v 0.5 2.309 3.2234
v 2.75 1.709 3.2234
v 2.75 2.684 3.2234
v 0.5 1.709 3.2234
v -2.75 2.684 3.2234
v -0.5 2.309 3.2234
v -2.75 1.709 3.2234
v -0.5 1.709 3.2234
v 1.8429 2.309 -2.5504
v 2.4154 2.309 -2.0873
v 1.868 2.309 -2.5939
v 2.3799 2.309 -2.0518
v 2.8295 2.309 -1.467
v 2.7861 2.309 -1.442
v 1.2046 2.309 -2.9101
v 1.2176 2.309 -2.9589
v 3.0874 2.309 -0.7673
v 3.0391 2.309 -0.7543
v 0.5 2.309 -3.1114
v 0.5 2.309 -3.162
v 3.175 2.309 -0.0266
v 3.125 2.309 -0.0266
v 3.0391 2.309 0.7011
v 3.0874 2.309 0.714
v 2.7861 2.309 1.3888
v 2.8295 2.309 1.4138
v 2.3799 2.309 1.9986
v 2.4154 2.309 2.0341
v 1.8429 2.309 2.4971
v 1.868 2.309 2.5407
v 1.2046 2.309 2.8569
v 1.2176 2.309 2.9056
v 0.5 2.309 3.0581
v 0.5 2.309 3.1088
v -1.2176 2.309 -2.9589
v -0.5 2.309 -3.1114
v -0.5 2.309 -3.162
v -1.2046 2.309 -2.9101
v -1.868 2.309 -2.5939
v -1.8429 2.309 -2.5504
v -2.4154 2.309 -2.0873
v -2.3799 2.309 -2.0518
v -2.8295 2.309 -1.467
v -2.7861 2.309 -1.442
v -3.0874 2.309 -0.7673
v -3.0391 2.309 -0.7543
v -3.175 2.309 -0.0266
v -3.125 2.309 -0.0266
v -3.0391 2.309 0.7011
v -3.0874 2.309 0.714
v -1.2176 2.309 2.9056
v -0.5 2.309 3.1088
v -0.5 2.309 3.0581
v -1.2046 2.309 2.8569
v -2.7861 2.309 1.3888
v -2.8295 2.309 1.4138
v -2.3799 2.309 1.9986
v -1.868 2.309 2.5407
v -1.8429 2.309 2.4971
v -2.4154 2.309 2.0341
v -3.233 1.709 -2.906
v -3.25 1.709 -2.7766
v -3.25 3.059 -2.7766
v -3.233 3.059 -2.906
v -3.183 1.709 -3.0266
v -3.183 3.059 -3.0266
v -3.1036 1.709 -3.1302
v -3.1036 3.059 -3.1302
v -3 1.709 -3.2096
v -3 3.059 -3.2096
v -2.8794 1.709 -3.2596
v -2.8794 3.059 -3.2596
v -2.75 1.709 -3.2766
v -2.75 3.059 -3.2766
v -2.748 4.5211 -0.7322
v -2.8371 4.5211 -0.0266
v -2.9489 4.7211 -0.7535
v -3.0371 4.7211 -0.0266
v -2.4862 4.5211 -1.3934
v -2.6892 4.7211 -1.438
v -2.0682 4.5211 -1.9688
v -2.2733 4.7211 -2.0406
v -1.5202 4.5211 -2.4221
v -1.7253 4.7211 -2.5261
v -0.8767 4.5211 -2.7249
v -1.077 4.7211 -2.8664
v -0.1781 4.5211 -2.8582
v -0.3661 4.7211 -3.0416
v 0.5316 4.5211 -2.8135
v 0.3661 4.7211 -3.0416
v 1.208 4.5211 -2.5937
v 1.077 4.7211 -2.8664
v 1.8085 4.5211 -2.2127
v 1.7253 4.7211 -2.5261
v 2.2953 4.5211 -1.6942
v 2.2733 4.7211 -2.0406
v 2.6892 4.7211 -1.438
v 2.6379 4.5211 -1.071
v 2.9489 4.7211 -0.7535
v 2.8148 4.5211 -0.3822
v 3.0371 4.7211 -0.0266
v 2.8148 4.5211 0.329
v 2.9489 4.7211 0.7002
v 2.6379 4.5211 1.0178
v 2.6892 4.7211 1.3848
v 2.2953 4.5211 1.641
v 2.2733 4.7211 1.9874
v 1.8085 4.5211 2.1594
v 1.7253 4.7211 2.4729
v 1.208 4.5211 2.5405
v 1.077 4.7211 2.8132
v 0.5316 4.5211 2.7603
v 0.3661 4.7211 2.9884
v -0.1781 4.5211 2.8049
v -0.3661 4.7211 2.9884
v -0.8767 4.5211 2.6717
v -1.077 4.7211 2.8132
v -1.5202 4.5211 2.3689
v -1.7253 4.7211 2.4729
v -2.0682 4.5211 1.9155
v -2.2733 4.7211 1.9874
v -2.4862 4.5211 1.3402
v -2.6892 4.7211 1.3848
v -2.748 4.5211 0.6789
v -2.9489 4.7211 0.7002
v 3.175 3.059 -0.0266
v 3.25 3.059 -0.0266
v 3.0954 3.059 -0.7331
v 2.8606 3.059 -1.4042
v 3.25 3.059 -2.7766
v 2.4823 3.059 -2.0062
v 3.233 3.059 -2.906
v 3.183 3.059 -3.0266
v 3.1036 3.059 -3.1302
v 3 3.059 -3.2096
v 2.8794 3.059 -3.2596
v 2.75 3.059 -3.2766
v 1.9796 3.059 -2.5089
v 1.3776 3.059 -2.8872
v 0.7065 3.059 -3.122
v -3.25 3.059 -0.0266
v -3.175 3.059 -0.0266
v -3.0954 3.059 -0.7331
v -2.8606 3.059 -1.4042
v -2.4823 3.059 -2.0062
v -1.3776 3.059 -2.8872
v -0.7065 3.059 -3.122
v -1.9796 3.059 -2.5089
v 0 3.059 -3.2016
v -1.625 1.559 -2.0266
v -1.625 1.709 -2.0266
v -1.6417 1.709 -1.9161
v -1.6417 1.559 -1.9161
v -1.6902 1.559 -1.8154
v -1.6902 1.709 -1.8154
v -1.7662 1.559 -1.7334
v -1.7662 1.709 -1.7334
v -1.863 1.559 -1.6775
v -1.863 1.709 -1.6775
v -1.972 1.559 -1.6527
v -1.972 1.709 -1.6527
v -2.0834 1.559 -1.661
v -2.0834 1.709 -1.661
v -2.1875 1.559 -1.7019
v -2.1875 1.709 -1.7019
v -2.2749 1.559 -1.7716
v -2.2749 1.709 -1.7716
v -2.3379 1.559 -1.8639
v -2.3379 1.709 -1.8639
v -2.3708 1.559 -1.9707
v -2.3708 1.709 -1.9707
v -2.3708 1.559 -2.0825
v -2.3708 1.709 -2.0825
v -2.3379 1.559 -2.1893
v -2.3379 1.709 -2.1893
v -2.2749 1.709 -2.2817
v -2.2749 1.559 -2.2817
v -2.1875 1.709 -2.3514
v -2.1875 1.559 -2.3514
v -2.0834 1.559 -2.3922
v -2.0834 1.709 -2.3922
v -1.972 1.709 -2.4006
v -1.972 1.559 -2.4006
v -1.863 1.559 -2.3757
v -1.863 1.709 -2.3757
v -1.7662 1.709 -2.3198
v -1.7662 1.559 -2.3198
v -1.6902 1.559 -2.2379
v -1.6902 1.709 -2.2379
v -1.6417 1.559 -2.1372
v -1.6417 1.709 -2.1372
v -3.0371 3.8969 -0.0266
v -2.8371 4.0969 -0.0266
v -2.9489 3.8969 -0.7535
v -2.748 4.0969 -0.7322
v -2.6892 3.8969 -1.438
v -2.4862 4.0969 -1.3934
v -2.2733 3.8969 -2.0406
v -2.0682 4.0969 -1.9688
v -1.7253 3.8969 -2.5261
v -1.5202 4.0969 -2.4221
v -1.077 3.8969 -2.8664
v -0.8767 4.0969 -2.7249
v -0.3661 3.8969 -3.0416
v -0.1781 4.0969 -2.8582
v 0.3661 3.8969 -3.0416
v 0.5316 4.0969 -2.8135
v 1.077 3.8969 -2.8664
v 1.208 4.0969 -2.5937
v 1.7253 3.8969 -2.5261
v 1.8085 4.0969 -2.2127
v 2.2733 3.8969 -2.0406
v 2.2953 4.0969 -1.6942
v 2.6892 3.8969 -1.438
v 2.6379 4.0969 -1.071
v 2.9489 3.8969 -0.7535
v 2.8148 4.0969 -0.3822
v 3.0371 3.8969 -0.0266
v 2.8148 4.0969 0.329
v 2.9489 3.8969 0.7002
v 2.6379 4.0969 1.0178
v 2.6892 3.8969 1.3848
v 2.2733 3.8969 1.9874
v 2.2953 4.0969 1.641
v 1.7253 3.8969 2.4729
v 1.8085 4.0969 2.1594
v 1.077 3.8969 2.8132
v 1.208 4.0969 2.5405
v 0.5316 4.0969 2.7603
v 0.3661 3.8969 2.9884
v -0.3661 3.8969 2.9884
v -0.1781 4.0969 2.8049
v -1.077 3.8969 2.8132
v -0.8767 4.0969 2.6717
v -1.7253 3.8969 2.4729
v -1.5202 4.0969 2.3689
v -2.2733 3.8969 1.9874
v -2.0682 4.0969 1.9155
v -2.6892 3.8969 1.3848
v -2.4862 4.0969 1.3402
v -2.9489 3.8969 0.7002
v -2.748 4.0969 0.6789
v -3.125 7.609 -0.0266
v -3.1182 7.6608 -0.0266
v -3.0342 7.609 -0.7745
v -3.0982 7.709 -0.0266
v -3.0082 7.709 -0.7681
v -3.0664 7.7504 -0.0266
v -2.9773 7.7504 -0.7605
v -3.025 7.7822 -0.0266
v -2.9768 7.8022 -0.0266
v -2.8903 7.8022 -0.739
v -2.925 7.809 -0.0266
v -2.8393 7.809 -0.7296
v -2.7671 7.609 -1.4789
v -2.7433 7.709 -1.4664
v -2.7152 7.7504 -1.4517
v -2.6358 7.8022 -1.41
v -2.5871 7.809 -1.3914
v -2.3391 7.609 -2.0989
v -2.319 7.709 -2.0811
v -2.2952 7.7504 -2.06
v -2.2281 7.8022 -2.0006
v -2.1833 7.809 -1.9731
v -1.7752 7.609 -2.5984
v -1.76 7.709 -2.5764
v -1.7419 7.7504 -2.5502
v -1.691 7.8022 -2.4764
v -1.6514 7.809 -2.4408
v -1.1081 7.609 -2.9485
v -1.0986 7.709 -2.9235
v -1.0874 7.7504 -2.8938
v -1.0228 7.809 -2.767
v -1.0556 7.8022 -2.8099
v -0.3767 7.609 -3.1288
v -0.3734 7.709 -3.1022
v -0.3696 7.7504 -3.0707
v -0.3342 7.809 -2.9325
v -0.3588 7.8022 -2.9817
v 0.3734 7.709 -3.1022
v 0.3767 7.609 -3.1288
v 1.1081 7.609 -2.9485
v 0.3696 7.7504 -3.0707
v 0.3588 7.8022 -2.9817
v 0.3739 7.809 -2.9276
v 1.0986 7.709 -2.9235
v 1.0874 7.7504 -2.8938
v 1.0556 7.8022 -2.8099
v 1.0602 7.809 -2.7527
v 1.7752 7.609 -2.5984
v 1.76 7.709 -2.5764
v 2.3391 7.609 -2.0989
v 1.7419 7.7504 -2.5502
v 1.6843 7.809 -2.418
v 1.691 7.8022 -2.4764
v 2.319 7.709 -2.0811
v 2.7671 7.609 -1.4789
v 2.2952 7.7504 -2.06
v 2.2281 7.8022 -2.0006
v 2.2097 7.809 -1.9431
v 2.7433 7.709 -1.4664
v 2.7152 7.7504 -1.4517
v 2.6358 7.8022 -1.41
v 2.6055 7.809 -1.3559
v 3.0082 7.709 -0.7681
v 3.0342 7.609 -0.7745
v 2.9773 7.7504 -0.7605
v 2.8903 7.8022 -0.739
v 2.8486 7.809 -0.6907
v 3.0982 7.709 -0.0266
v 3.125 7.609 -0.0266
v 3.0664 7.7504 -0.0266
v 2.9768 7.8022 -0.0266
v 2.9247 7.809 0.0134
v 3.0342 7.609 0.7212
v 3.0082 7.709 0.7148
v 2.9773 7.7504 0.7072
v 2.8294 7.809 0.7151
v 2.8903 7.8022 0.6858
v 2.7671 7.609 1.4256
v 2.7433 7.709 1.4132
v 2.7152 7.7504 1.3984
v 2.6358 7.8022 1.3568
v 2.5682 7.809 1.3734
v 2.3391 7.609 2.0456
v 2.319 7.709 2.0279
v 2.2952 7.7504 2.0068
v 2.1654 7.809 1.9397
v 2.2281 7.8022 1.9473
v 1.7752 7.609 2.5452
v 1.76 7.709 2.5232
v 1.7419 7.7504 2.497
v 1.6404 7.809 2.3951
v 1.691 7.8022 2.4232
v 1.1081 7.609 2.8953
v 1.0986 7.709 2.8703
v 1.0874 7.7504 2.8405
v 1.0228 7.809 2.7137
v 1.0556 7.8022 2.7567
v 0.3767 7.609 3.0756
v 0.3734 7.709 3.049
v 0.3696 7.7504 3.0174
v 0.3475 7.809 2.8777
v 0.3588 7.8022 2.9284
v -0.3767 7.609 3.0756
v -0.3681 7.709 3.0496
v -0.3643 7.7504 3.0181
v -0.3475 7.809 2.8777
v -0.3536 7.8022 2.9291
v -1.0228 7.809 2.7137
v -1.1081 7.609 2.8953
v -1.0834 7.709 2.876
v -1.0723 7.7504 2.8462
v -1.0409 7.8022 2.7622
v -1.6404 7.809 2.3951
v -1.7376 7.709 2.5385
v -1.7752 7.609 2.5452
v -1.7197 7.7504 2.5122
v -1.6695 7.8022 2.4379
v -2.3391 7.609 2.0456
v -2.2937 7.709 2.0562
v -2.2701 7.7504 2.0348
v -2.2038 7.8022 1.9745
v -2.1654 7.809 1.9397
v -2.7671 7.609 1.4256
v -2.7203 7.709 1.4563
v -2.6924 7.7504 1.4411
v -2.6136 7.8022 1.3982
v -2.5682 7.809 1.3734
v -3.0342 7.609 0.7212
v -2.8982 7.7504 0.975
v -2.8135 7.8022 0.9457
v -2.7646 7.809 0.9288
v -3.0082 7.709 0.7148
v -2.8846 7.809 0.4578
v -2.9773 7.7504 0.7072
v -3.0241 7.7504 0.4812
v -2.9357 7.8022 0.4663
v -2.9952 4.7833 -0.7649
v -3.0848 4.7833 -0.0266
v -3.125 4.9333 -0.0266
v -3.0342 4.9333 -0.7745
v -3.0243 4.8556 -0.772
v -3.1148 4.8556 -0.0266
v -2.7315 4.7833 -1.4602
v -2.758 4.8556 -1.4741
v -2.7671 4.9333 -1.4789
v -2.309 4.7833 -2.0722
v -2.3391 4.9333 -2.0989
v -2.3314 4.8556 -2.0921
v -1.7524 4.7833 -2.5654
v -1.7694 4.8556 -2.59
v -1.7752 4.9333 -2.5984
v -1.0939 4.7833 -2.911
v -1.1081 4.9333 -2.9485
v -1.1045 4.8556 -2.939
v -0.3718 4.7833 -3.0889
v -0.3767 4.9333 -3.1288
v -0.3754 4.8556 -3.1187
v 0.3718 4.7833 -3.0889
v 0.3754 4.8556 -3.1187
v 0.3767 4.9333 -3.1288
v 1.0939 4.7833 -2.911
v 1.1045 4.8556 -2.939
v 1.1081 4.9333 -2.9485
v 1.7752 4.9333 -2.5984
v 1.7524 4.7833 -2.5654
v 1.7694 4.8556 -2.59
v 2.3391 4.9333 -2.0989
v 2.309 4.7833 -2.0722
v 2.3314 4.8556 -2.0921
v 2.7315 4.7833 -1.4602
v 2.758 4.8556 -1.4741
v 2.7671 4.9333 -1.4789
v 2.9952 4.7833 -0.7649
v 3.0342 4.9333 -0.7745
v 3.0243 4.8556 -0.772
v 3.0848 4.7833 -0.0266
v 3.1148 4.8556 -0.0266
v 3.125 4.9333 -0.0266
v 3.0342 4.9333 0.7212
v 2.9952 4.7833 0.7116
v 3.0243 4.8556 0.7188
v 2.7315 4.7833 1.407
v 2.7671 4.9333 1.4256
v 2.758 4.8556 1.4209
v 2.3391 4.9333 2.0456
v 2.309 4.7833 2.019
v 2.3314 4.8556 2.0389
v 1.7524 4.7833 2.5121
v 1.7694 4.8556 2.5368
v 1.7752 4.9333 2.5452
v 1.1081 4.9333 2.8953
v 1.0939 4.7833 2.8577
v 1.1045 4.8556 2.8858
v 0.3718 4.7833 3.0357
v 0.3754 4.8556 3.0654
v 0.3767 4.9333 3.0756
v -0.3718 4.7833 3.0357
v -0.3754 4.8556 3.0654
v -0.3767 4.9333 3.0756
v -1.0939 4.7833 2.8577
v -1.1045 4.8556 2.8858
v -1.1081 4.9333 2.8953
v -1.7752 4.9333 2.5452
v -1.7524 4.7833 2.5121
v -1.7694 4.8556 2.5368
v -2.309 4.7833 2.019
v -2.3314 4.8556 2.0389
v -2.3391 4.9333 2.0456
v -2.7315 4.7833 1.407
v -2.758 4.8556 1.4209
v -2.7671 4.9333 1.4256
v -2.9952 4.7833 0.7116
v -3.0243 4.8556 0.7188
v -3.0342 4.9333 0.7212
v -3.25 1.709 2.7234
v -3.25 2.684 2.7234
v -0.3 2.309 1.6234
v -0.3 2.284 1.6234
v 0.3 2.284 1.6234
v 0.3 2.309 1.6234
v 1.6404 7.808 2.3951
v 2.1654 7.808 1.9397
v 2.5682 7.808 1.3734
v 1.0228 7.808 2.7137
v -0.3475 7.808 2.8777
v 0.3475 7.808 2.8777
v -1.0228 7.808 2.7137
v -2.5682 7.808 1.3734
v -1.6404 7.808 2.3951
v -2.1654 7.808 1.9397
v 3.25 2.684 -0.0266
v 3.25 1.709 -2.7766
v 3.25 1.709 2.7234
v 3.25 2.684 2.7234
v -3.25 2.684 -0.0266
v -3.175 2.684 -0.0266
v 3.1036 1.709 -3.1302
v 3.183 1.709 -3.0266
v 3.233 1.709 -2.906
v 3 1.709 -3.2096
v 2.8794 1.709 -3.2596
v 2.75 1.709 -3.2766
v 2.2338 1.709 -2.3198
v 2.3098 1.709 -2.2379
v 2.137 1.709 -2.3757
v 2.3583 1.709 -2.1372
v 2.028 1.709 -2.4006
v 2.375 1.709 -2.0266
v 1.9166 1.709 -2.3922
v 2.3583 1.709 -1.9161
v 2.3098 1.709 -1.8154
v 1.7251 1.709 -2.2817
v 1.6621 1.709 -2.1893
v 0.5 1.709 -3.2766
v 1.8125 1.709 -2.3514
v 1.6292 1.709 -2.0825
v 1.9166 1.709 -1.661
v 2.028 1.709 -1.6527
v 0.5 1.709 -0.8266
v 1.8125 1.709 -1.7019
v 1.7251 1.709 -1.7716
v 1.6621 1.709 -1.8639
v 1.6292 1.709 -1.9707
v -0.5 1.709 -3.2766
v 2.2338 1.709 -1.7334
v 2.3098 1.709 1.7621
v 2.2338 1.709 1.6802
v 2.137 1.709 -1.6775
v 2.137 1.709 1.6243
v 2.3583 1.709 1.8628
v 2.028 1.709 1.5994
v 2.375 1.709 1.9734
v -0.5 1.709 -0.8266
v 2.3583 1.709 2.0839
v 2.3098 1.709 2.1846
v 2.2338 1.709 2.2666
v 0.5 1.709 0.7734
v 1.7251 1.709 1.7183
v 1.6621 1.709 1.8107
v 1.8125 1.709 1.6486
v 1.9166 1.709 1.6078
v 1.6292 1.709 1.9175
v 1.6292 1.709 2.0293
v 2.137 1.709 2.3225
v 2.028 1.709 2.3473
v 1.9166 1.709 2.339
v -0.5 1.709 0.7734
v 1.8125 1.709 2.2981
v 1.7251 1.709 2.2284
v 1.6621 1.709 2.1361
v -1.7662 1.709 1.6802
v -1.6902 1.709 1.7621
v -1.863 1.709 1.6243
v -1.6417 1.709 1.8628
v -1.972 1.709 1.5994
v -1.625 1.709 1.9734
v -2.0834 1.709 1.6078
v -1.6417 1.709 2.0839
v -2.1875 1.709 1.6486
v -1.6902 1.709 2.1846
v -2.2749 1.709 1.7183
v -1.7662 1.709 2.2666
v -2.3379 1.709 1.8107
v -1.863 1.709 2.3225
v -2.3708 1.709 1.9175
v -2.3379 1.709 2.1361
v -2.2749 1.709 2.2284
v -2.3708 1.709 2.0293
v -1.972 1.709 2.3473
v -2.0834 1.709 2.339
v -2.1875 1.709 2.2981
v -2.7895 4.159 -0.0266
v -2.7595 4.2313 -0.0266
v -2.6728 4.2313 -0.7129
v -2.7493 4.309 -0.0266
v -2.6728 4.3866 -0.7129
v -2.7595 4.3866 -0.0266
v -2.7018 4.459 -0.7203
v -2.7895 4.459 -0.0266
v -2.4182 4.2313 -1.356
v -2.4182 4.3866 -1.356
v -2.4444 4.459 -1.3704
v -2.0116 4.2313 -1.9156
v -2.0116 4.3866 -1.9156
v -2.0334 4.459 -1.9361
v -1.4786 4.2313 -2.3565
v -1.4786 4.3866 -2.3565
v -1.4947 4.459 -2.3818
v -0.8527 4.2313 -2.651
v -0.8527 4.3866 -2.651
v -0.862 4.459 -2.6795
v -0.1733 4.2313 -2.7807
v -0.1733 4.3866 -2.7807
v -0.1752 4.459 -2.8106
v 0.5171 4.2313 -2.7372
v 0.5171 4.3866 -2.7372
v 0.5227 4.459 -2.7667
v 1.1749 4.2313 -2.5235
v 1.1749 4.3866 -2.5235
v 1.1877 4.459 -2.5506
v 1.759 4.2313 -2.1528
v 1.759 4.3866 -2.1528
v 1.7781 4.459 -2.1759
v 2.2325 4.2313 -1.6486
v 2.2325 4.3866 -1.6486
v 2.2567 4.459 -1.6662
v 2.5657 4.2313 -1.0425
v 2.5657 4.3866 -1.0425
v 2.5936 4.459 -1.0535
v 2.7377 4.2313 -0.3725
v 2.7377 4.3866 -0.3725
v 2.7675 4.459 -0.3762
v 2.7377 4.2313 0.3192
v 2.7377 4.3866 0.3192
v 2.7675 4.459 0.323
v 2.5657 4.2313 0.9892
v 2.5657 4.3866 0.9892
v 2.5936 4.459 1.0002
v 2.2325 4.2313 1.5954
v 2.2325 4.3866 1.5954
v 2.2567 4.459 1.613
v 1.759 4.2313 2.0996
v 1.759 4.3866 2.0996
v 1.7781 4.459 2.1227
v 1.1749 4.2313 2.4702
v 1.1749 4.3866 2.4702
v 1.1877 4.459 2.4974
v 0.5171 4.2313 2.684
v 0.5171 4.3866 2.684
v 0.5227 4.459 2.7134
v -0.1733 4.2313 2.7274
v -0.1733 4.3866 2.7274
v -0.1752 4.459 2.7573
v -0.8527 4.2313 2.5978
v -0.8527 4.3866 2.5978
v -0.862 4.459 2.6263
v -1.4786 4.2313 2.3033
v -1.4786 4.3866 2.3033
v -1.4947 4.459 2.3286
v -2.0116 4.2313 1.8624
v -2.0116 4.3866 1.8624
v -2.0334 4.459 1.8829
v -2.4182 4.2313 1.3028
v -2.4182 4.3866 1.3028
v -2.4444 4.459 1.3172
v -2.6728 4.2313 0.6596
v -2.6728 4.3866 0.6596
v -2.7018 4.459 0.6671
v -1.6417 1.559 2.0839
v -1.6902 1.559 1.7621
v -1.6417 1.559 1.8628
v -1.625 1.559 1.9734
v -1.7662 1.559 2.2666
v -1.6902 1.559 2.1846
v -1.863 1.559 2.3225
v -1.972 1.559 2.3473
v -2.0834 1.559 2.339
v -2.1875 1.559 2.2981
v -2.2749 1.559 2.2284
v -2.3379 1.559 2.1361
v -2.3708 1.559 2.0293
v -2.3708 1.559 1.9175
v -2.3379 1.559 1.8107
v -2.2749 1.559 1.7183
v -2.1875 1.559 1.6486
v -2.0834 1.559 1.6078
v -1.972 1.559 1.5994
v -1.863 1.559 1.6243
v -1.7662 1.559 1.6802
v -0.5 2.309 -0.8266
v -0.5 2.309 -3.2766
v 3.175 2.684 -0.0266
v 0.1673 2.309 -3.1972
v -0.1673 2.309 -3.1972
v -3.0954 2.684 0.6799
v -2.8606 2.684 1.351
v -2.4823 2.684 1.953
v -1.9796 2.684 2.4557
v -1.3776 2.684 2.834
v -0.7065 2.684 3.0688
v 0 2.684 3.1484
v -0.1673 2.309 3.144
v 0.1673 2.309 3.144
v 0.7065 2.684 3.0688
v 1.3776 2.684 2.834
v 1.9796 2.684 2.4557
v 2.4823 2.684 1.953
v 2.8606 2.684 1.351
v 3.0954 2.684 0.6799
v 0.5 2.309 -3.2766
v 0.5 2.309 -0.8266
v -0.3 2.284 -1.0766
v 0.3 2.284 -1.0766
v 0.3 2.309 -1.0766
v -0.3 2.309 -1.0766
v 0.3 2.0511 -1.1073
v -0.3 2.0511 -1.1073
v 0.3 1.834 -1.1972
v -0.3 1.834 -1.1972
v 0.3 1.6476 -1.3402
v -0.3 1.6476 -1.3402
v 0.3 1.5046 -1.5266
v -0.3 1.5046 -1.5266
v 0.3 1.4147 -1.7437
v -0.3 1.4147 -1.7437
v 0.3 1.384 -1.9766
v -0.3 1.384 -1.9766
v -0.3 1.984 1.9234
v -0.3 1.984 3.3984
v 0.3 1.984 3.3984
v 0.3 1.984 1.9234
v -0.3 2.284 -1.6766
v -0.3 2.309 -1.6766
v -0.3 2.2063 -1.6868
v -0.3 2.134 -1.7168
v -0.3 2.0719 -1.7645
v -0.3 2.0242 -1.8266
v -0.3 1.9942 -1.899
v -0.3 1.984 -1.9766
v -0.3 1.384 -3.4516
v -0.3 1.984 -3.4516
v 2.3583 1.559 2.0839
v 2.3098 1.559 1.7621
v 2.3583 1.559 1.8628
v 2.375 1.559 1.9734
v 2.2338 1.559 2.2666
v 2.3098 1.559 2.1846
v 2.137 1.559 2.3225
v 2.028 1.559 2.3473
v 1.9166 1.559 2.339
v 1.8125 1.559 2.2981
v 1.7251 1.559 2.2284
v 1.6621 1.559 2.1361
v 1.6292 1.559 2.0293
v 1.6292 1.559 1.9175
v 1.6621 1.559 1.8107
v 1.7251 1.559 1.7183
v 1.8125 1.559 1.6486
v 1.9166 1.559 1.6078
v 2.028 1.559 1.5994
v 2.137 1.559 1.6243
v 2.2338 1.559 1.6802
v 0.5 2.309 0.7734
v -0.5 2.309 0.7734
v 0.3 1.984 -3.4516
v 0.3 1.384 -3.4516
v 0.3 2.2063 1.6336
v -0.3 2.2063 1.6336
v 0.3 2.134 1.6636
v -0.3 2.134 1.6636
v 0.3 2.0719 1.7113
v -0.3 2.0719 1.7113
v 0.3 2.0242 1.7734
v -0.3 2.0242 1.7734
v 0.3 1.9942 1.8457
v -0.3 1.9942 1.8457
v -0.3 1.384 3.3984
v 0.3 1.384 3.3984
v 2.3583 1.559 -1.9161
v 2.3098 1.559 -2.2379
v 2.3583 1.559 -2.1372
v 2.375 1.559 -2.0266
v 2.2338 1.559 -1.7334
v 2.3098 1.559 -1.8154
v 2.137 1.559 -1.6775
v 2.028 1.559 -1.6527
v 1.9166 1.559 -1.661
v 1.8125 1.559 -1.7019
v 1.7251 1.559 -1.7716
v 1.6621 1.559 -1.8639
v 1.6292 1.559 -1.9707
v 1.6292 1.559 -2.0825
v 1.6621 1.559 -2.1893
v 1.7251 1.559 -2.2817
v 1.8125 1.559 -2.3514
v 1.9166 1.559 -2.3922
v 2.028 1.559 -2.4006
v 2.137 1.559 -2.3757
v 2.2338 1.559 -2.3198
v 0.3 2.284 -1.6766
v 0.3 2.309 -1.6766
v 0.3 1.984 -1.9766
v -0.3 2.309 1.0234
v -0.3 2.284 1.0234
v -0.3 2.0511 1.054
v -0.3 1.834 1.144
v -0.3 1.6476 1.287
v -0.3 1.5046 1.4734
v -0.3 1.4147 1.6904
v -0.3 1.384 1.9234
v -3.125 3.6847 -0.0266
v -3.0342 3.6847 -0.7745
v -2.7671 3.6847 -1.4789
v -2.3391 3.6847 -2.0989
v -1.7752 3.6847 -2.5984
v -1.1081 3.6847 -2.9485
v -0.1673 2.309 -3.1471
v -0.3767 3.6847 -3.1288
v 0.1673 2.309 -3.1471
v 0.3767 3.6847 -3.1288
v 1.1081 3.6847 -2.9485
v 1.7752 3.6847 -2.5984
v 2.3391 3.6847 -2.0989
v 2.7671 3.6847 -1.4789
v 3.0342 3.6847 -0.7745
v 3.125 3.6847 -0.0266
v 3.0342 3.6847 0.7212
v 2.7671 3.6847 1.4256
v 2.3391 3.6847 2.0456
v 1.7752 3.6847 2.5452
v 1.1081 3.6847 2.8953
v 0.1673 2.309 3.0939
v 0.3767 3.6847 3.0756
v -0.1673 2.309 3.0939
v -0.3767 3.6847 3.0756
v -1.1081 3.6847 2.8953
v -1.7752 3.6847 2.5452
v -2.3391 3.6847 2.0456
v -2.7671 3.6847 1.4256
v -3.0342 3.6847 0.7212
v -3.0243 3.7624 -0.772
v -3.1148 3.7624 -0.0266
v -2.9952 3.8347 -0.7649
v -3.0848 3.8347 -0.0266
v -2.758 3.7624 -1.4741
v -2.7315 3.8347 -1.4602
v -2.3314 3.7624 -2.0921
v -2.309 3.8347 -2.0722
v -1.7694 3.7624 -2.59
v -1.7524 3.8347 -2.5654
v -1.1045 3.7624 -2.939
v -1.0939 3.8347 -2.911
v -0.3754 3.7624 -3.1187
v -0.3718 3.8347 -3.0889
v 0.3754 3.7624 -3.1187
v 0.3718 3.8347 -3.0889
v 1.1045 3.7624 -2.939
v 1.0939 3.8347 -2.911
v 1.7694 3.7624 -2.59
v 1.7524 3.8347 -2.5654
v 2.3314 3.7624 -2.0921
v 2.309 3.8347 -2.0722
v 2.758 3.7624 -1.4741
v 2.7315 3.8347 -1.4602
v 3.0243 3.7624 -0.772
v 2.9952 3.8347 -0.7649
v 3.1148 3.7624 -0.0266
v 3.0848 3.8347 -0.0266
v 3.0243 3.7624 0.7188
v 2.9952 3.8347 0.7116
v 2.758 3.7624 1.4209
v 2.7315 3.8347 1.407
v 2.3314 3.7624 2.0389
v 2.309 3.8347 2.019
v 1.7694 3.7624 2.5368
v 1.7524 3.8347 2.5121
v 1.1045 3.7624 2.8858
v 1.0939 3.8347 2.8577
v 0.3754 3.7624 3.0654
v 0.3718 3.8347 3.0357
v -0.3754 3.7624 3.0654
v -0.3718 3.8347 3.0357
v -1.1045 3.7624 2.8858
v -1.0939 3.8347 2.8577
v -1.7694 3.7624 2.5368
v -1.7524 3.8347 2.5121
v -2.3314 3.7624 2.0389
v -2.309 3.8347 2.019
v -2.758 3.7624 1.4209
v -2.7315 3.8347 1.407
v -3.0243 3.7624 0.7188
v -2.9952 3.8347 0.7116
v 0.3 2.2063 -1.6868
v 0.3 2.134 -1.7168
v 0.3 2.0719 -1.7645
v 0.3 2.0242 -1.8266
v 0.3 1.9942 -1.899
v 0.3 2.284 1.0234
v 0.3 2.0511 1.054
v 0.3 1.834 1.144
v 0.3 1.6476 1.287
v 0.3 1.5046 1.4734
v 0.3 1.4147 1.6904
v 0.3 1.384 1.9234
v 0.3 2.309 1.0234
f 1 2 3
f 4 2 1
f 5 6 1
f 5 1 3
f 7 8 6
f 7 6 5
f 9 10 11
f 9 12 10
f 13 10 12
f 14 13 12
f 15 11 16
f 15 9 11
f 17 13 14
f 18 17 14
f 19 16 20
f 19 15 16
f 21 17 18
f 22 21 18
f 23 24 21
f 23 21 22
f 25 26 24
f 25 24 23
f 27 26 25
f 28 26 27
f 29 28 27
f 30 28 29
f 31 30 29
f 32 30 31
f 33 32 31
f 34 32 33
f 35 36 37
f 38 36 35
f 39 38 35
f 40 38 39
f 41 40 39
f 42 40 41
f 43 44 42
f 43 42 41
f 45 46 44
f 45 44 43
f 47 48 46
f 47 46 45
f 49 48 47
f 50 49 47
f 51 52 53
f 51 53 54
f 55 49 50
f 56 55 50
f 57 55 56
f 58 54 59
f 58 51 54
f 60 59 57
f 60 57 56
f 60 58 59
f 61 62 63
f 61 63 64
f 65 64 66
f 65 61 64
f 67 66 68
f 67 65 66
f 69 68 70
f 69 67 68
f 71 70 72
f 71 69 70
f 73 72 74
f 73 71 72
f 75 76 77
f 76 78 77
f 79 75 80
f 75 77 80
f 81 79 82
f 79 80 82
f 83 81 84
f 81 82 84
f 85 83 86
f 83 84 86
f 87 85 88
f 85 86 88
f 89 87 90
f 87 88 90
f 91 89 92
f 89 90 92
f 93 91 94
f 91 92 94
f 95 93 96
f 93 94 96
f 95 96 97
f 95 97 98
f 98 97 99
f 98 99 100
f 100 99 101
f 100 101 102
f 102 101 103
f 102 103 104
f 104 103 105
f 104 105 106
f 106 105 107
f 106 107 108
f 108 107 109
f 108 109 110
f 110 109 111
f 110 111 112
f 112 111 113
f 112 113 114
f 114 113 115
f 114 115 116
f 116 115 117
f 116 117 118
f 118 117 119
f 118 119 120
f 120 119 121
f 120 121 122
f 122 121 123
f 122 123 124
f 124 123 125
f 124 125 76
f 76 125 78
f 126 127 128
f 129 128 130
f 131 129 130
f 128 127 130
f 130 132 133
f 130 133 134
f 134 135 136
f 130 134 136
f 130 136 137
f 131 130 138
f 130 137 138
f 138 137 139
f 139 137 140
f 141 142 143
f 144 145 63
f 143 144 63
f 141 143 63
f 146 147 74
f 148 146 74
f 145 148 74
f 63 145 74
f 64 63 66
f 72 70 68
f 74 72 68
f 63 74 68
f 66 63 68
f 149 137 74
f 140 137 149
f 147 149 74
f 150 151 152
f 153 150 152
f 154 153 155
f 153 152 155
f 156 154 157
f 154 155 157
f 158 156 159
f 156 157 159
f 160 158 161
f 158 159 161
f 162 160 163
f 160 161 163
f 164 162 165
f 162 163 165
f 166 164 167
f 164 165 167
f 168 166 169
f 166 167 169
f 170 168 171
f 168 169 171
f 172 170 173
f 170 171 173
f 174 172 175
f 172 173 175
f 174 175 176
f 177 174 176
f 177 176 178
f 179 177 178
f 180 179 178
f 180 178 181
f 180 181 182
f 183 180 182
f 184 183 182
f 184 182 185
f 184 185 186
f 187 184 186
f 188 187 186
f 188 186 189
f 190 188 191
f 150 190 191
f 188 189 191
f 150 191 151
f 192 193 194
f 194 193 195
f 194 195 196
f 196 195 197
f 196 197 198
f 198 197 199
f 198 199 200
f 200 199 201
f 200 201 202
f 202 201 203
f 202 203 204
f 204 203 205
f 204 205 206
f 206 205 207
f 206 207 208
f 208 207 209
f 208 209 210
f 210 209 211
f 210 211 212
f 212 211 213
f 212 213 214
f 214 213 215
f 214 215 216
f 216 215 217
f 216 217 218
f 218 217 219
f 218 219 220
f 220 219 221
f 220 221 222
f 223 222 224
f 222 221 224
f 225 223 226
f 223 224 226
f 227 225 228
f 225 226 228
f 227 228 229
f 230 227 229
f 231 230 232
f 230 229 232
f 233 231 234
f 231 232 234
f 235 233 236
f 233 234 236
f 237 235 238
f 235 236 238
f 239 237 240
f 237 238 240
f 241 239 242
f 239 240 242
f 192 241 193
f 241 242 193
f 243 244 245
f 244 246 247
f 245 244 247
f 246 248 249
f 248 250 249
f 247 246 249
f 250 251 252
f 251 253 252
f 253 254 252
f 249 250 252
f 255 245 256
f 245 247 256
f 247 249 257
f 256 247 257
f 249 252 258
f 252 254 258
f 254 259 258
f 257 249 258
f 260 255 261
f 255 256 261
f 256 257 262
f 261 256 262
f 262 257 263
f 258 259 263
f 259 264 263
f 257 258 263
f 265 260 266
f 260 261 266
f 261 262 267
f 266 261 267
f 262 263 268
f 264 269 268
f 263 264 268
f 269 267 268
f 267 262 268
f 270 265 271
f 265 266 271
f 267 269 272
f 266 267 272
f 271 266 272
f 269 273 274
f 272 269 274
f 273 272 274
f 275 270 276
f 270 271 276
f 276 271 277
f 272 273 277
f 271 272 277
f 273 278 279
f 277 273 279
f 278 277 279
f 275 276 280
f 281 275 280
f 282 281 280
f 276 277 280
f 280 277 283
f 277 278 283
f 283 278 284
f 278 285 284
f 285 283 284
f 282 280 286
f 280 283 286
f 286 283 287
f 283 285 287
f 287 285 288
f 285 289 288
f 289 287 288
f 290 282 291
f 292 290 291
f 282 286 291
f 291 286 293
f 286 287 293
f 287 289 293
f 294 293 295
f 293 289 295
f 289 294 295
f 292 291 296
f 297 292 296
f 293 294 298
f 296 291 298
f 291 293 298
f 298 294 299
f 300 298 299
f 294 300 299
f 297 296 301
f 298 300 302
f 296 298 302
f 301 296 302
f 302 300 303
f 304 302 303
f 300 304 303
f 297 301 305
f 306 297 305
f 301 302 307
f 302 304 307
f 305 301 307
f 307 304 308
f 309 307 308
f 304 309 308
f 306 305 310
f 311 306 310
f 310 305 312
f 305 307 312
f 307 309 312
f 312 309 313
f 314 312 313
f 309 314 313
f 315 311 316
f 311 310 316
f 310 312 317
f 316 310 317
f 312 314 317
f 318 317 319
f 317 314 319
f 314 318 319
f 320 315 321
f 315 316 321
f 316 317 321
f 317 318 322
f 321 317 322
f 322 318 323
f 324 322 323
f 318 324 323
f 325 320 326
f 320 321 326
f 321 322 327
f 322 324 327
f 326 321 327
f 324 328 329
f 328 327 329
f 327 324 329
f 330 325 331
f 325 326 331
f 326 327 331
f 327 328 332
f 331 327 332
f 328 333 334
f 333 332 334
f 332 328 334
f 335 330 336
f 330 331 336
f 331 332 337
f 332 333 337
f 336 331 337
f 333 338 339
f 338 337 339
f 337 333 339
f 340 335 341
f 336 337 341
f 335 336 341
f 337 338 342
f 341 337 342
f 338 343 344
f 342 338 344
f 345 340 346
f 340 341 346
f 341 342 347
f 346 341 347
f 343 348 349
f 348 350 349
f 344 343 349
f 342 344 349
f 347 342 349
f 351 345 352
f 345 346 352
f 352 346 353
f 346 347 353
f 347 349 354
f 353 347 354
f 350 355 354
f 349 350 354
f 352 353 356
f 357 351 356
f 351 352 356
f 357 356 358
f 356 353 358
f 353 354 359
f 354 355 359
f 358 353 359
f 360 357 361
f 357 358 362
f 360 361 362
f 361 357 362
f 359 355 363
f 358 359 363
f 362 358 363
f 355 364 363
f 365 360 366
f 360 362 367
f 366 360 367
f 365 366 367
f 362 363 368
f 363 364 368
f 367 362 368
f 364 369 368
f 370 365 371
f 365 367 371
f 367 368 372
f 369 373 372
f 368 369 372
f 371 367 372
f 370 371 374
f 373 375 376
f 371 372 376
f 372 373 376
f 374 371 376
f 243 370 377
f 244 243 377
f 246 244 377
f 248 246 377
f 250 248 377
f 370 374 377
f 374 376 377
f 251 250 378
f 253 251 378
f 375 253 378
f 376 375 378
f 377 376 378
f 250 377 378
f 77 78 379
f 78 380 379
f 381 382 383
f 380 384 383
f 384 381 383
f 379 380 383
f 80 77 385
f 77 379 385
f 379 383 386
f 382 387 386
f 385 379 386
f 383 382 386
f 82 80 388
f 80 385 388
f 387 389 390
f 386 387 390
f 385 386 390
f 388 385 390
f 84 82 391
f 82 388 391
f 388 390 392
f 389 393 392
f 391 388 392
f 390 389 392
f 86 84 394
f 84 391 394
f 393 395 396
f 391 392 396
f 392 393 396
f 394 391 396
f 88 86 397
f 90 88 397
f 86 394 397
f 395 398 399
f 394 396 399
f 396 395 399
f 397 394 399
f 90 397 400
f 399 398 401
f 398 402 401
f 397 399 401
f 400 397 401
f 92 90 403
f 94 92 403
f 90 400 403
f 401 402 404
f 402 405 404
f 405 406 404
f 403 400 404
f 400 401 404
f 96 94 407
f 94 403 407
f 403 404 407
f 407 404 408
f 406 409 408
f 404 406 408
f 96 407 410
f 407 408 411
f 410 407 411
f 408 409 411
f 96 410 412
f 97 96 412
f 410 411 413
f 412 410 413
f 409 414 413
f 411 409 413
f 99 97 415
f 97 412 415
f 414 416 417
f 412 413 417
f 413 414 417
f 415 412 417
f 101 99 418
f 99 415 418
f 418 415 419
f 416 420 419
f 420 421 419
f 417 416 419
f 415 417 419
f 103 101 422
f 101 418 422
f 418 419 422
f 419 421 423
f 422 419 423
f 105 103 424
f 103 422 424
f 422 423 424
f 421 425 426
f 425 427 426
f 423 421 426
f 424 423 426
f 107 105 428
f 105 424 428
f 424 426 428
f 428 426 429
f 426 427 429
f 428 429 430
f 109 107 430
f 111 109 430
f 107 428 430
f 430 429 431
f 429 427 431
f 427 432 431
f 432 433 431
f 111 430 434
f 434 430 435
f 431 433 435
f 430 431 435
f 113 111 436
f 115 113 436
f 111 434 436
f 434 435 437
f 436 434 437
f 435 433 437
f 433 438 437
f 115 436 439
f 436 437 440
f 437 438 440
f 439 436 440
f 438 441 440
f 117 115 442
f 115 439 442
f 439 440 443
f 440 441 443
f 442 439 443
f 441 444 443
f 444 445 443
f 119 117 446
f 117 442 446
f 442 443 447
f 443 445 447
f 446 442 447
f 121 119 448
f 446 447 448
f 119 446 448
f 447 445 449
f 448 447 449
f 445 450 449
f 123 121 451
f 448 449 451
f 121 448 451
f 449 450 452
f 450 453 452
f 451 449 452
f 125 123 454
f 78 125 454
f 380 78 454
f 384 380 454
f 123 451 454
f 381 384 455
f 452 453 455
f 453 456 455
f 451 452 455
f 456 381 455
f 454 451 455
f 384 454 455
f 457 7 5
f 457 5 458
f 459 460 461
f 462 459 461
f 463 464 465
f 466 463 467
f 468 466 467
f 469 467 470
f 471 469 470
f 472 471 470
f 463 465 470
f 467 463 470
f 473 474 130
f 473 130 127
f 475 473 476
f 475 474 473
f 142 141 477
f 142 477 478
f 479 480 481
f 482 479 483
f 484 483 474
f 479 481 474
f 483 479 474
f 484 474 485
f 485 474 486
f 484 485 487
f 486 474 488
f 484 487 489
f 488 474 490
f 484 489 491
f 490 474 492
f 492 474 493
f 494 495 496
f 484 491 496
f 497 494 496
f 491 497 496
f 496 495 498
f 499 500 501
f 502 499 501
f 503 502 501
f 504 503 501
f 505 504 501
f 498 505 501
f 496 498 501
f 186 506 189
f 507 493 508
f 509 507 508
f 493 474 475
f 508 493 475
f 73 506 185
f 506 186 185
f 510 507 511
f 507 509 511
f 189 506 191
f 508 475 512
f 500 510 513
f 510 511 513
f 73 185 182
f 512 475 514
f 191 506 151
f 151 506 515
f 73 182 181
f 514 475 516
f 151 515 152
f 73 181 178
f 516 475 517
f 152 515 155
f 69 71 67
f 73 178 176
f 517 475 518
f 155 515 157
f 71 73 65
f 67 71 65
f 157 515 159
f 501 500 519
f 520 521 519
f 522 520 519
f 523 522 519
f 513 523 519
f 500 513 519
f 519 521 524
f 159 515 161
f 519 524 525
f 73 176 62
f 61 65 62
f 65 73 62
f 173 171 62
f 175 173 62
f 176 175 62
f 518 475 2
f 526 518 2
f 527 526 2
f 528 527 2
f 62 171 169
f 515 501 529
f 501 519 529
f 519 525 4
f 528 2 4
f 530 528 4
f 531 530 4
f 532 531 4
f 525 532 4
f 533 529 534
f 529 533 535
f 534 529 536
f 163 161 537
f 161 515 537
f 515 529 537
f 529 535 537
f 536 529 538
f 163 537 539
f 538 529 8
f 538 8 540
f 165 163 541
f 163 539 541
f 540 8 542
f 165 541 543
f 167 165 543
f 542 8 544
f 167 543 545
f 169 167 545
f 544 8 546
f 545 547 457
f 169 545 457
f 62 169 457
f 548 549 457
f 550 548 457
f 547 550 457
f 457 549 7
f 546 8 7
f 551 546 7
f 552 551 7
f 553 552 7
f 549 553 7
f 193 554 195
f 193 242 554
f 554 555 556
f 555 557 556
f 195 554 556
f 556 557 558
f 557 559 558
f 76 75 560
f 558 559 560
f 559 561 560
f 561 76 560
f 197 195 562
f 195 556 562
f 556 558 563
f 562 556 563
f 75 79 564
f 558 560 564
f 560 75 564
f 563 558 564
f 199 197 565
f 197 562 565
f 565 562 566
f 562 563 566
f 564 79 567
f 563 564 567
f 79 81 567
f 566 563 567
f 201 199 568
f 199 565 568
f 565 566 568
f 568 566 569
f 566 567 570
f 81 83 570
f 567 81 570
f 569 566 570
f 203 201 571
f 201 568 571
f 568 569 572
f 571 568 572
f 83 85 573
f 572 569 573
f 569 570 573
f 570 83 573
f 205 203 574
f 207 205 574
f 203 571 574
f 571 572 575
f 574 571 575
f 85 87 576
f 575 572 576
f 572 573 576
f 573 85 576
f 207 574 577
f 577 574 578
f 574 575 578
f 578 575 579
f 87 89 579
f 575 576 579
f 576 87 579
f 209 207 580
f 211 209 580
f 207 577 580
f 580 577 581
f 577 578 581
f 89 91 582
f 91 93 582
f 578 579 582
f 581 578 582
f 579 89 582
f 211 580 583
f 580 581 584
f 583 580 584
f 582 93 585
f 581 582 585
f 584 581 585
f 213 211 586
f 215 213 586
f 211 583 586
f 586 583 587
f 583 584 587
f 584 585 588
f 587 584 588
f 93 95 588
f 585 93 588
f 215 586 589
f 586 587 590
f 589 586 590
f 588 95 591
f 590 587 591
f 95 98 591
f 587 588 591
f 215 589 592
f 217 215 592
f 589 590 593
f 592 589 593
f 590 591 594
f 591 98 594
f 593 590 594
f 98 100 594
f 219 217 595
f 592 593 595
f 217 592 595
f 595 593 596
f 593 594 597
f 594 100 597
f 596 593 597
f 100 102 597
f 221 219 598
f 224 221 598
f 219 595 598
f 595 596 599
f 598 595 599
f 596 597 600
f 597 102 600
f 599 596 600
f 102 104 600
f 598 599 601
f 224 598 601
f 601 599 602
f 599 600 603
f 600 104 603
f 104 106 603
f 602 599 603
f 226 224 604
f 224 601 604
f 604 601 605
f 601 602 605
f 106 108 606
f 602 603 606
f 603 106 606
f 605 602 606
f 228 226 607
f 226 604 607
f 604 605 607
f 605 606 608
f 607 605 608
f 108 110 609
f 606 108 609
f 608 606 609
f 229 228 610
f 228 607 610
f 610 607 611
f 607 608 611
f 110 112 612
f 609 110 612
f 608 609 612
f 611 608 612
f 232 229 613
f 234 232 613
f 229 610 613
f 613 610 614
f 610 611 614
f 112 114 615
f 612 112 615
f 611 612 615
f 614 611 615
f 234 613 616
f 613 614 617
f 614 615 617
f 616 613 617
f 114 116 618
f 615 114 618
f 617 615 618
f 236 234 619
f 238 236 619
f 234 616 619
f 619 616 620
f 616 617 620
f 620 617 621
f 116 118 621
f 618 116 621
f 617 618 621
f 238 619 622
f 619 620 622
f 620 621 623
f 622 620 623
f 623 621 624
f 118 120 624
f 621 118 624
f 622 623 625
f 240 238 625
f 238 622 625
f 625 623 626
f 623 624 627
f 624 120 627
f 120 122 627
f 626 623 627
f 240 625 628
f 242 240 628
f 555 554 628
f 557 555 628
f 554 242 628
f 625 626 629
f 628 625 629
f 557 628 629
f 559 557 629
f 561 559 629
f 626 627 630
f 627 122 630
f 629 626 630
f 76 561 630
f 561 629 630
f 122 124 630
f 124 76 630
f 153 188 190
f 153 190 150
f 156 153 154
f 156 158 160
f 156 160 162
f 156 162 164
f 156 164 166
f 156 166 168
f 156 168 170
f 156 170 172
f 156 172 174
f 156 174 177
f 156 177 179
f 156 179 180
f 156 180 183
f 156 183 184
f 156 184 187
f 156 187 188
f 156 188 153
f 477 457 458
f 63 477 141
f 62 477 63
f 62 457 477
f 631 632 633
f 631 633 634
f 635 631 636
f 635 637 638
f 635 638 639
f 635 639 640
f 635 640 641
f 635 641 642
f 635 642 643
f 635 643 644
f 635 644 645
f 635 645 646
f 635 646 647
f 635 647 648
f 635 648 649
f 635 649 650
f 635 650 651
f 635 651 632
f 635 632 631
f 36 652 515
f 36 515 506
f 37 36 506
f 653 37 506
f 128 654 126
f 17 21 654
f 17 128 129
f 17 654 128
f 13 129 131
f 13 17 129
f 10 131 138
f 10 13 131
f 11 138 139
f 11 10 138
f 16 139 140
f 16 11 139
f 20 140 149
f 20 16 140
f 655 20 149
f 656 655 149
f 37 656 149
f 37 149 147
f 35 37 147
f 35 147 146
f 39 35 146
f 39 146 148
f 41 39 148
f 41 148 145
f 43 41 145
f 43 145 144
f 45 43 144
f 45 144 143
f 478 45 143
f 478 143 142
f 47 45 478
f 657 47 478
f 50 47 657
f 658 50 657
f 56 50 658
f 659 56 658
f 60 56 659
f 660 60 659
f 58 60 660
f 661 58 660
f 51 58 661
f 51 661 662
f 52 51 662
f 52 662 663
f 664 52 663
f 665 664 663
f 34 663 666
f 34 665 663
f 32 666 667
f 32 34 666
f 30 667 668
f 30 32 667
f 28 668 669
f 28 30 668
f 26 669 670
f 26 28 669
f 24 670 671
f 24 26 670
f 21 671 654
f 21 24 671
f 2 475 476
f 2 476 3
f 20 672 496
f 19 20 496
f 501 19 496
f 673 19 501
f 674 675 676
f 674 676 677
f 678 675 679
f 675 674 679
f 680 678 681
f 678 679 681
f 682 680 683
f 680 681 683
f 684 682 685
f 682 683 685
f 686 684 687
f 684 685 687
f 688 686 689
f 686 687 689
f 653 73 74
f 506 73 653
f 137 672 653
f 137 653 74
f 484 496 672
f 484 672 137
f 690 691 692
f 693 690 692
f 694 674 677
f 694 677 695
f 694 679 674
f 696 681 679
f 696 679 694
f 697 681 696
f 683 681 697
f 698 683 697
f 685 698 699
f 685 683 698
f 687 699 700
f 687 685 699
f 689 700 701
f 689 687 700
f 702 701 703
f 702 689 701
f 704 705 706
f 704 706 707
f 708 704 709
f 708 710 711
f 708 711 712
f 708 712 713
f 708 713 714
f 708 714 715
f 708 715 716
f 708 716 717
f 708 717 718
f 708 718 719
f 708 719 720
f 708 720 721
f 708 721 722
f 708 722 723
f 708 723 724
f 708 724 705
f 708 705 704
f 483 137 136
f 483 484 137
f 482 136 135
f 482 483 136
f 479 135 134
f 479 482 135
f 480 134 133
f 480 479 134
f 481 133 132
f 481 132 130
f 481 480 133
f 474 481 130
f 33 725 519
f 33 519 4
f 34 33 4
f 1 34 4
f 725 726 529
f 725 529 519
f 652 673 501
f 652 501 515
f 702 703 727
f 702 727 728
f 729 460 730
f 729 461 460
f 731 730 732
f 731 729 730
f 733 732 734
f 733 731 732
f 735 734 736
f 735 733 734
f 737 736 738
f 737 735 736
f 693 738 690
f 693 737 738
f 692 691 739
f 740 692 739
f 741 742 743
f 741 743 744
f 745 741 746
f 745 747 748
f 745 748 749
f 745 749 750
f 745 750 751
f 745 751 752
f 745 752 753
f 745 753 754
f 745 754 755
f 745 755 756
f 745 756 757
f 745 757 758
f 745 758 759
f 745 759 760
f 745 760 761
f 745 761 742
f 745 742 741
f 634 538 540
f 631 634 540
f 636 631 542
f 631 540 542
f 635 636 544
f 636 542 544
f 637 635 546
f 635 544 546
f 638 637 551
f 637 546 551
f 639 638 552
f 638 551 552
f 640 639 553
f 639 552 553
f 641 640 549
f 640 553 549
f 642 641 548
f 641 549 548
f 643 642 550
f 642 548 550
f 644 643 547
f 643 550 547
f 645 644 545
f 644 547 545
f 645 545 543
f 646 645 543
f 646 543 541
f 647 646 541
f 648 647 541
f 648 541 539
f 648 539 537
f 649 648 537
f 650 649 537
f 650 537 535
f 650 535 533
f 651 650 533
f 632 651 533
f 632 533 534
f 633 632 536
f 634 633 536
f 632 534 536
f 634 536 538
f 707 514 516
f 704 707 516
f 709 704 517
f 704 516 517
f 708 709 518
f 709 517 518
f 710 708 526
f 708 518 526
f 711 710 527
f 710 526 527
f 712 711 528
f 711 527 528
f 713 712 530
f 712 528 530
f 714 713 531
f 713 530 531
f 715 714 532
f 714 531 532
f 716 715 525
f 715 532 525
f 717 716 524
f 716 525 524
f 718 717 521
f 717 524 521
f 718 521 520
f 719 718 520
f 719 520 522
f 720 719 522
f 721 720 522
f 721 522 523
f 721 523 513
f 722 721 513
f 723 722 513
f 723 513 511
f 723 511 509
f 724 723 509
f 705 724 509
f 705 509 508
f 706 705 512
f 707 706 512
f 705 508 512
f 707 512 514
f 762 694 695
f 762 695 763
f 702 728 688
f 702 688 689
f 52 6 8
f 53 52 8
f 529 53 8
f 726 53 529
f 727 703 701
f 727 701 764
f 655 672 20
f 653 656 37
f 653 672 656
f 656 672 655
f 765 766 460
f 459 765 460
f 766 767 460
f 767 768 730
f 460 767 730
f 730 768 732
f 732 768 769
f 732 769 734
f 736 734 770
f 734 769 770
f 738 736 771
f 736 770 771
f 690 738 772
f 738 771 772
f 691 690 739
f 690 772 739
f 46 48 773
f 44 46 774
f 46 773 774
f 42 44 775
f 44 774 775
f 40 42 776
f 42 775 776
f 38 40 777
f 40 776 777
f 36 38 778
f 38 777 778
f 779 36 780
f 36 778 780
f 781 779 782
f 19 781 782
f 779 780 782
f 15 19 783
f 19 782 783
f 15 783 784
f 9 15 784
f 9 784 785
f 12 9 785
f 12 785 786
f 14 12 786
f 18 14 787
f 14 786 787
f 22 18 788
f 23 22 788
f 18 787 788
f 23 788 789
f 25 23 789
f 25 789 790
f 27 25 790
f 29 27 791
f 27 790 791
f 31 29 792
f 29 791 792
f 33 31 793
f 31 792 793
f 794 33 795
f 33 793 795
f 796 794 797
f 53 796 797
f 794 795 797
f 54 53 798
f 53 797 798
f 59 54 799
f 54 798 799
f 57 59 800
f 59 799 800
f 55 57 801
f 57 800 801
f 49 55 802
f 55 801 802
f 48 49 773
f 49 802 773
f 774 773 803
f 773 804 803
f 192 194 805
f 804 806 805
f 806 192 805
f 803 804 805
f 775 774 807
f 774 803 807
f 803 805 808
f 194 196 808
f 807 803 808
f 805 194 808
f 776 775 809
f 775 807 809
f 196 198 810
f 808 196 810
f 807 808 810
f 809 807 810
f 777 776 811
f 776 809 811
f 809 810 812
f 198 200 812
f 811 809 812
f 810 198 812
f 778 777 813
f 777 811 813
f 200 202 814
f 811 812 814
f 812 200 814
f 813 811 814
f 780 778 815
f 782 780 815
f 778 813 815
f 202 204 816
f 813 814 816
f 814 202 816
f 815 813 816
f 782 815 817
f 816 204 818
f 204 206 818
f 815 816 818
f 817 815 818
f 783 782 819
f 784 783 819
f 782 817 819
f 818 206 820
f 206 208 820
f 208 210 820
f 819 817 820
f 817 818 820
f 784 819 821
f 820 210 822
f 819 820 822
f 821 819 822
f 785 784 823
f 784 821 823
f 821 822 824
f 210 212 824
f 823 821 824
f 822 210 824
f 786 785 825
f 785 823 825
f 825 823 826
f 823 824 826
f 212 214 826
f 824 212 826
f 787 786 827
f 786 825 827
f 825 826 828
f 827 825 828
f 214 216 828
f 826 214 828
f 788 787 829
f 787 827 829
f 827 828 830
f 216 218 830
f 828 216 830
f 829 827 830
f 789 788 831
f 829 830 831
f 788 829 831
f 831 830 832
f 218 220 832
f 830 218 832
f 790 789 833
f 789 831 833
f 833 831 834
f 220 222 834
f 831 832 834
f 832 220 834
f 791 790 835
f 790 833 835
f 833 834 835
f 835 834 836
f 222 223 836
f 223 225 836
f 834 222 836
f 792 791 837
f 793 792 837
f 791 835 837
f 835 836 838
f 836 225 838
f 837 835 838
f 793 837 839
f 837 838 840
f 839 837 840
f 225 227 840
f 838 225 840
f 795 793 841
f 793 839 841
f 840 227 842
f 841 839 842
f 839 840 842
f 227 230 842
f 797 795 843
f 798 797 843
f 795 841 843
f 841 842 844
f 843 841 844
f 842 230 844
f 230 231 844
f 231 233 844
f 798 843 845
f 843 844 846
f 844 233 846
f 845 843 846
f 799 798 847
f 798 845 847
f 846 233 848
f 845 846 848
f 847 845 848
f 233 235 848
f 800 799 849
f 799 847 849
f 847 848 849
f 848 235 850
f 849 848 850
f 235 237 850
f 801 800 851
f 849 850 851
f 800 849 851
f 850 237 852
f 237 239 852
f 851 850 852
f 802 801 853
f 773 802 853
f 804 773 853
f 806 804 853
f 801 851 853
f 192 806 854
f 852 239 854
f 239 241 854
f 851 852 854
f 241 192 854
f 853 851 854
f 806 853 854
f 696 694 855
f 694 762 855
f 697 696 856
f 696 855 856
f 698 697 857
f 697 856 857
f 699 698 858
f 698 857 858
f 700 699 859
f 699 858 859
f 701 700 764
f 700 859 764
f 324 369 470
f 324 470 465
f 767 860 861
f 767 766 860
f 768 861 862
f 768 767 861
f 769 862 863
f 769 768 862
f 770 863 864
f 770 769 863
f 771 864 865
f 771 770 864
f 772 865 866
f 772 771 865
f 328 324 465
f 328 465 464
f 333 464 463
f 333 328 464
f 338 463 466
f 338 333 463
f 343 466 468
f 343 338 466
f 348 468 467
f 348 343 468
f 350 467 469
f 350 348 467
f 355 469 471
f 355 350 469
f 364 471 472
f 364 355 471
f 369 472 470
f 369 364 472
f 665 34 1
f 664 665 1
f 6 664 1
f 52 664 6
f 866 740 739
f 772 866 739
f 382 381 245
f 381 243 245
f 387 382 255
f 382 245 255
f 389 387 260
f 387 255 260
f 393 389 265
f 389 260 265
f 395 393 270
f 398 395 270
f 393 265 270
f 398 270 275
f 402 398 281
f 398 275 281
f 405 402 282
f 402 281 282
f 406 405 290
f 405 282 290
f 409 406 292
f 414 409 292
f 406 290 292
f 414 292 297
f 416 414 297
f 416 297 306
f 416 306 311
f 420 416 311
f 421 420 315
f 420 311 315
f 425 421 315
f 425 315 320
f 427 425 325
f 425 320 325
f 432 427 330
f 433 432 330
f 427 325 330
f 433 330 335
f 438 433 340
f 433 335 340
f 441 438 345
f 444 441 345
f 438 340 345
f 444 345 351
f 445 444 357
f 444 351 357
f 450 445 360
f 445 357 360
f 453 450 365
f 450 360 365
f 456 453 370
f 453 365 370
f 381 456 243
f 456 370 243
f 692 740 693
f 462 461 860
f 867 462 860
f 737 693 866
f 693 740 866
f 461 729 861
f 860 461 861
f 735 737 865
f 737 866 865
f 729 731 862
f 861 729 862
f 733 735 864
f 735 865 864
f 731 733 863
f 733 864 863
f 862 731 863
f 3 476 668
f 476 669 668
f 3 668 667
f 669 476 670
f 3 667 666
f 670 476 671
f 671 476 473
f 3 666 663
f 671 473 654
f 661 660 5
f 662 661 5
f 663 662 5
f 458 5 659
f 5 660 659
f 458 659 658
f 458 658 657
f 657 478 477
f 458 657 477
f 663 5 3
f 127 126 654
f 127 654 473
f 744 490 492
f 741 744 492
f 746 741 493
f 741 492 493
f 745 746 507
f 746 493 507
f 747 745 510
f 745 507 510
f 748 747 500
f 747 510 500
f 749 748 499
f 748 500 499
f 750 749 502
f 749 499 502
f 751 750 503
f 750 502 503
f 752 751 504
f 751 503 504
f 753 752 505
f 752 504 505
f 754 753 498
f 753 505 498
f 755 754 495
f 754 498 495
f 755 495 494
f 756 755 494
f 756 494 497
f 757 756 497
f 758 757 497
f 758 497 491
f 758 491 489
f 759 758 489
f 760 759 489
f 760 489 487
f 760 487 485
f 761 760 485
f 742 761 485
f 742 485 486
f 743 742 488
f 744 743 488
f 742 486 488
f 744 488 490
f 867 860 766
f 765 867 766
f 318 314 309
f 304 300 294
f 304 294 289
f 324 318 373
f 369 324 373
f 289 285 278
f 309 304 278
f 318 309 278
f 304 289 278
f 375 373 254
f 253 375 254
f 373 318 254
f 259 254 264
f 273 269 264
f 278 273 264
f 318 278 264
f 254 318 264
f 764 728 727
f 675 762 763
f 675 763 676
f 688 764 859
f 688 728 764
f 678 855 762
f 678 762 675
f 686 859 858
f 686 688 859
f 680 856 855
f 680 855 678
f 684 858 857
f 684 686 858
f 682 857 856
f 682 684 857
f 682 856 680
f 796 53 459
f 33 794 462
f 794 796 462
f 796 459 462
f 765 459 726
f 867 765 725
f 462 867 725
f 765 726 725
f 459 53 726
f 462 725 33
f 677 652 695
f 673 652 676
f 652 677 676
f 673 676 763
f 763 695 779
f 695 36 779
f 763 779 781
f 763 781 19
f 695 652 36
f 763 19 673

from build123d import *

# Parameters (mm, degrees)
EXTRUDE1_DEPTH     = 1.2
SKETCH3_R          = 6.35
EXTRUDE2_DEPTH     = 1.5
EXTRUDE3_DEPTH     = 0.75
SKETCH5_R          = 0.75
EXTRUDE4_DEPTH     = 0.3
SKETCH7_W          = 1.2
SKETCH7_H          = 1.2
SCALE1_SCALE       = 0.5
CUT_EXTRUDE1_DEPTH = 0.001


with BuildPart() as part:
    # Sketch1 → Revolve1 (revolve)
    with BuildSketch(Plane.XY):
        with BuildLine():
            Line((0, 0), (-6.25, 0))
            Line((-6.25, 0), (-6.25, 2.751471863))
            ThreePointArc((-6.25, 2.751471863), (-6.20432772, 2.981081922), (-6.074264069, 3.175735931))
            Line((-6.074264069, 3.175735931), (-5.674264069, 3.575735931))
            ThreePointArc((-5.674264069, 3.575735931), (-5.498528137, 4), (-5.674264069, 4.424264069))
            Line((-5.674264069, 4.424264069), (-6.074264069, 4.824264069))
            ThreePointArc((-6.074264069, 4.824264069), (-6.20432772, 5.018918078), (-6.25, 5.248528137))
            Line((-6.25, 5.248528137), (-6.25, 10.6))
            ThreePointArc((-6.25, 10.6), (-6.132842712, 10.882842712), (-5.85, 11))
            Line((-5.85, 11), (0, 11))
            Line((0, 11), (0, 0))
        make_face()
    revolve(axis=Axis((0, 11, 0), (0, -1, 0)))

    # Sketch2 → Extrude1 (add)
    with BuildSketch(Plane.XZ):
        with BuildLine():
            Line((-6.5, 5.5), (-5.5, 6.5))
            Line((-5.5, 6.5), (-1, 6.5))
            Line((-1, 6.5), (-1, 1.6))
            Line((-1, 1.6), (1, 1.6))
            Line((1, 1.6), (1, 6.5))
            Line((1, 6.5), (5.5, 6.5))
            Line((5.5, 6.5), (6.5, 5.5))
            Line((6.5, 5.5), (6.5, -5.5))
            ThreePointArc((6.5, -5.5), (6.207106781, -6.207106781), (5.5, -6.5))
            Line((5.5, -6.5), (1, -6.5))
            Line((1, -6.5), (1, -1.6))
            Line((1, -1.6), (-1, -1.6))
            Line((-1, -1.6), (-1, -6.5))
            Line((-1, -6.5), (-5.5, -6.5))
            ThreePointArc((-5.5, -6.5), (-6.207106781, -6.207106781), (-6.5, -5.5))
            Line((-6.5, -5.5), (-6.5, 5.5))
        make_face()
    extrude(amount=EXTRUDE1_DEPTH)

    # Sketch3 → Extrude2 (add)
    with BuildSketch(Plane(origin=(0, 0, 0), x_dir=(1, 0, 0), z_dir=(0, 1, 0))):
        with BuildLine():
            Line((5.5, -6.5), (-5.5, -6.5))
            Line((-5.5, -6.5), (-6.5, -5.5))
            Line((-6.5, -5.5), (-6.5, 5.5))
            ThreePointArc((-6.5, 5.5), (-6.207106781, 6.207106781), (-5.5, 6.5))
            Line((-5.5, 6.5), (5.5, 6.5))
            ThreePointArc((5.5, 6.5), (6.207106781, 6.207106781), (6.5, 5.5))
            Line((6.5, 5.5), (6.5, -5.5))
            Line((6.5, -5.5), (5.5, -6.5))
        make_face()
        Circle(SKETCH3_R, mode=Mode.SUBTRACT)
    extrude(amount=EXTRUDE2_DEPTH)

    # Sketch4 → Extrude3 (cut)
    with BuildSketch(Plane(origin=(0, 1.5, 0), x_dir=(1, 0, 0), z_dir=(0, 1, 0))):
        with BuildLine():
            Line((-6.5, 0), (-6.35, 0))
            ThreePointArc((-6.35, 0), (0, -6.35), (6.35, 0))
            Line((6.35, 0), (6.5, 0))
            Line((6.5, 0), (6.5, -5.5))
            Line((6.5, -5.5), (5.5, -6.5))
            Line((5.5, -6.5), (-5.5, -6.5))
            Line((-5.5, -6.5), (-6.5, -5.5))
            Line((-6.5, -5.5), (-6.5, 0))
        make_face()
    extrude(amount=-EXTRUDE3_DEPTH, mode=Mode.SUBTRACT)

    # Sketch5 → Extrude4 (add)
    with BuildSketch(Plane.XZ.offset(1.2)):
        with Locations((-4, 4)):
            Circle(SKETCH5_R)
        with Locations((4, 4)):
            Circle(SKETCH5_R)
        with Locations((-4, -4)):
            Circle(SKETCH5_R)
        with Locations((4, -4)):
            Circle(SKETCH5_R)
    extrude(amount=EXTRUDE4_DEPTH)

    # Sweep1: sweep along a path in Sketch6
    with BuildLine(Plane(origin=(0, 0, 0), x_dir=(0, 0, -1), z_dir=(1, 0, 0))) as sweep1_path:
        Line((2.7, 0), (2.7, -0.05))
        ThreePointArc((2.7, -0.05), (3.051471863, -0.898528137), (3.9, -1.25))
        Line((3.9, -1.25), (6.85, -1.25))
    # Sketch7 → Sweep1 (sweep)
    with BuildSketch(Plane.XZ):
        with Locations((0, -2.7)):
            Rectangle(SKETCH7_W, SKETCH7_H)
    sweep1 = sweep(path=sweep1_path.line)

    # Mirror1: Sweep1 across plane
    add(sweep1.mirror(Plane.XY))


with BuildPart() as part_1:
    # Scale1: scaled about (0, 4.617982794, -0.053235297)
    add(part.part.scale(SCALE1_SCALE).moved(Location((0, 2.308991397, -0.026617649))))

    # Sketch8 → Cut-Extrude1 (cut)
    with BuildSketch(Plane(origin=(0, 7.808991397, 0), x_dir=(1, 0, 0), z_dir=(0, 1, 0))):
        with BuildLine():
            Line((-2.568194891, -1.373382352), (2.568194891, -1.373382352))
            ThreePointArc((2.568194891, -1.373382352), (0, -2.898382352), (-2.568194891, -1.373382352))
        make_face()
    extrude(amount=-CUT_EXTRUDE1_DEPTH, mode=Mode.SUBTRACT)


solid = part_1.part
